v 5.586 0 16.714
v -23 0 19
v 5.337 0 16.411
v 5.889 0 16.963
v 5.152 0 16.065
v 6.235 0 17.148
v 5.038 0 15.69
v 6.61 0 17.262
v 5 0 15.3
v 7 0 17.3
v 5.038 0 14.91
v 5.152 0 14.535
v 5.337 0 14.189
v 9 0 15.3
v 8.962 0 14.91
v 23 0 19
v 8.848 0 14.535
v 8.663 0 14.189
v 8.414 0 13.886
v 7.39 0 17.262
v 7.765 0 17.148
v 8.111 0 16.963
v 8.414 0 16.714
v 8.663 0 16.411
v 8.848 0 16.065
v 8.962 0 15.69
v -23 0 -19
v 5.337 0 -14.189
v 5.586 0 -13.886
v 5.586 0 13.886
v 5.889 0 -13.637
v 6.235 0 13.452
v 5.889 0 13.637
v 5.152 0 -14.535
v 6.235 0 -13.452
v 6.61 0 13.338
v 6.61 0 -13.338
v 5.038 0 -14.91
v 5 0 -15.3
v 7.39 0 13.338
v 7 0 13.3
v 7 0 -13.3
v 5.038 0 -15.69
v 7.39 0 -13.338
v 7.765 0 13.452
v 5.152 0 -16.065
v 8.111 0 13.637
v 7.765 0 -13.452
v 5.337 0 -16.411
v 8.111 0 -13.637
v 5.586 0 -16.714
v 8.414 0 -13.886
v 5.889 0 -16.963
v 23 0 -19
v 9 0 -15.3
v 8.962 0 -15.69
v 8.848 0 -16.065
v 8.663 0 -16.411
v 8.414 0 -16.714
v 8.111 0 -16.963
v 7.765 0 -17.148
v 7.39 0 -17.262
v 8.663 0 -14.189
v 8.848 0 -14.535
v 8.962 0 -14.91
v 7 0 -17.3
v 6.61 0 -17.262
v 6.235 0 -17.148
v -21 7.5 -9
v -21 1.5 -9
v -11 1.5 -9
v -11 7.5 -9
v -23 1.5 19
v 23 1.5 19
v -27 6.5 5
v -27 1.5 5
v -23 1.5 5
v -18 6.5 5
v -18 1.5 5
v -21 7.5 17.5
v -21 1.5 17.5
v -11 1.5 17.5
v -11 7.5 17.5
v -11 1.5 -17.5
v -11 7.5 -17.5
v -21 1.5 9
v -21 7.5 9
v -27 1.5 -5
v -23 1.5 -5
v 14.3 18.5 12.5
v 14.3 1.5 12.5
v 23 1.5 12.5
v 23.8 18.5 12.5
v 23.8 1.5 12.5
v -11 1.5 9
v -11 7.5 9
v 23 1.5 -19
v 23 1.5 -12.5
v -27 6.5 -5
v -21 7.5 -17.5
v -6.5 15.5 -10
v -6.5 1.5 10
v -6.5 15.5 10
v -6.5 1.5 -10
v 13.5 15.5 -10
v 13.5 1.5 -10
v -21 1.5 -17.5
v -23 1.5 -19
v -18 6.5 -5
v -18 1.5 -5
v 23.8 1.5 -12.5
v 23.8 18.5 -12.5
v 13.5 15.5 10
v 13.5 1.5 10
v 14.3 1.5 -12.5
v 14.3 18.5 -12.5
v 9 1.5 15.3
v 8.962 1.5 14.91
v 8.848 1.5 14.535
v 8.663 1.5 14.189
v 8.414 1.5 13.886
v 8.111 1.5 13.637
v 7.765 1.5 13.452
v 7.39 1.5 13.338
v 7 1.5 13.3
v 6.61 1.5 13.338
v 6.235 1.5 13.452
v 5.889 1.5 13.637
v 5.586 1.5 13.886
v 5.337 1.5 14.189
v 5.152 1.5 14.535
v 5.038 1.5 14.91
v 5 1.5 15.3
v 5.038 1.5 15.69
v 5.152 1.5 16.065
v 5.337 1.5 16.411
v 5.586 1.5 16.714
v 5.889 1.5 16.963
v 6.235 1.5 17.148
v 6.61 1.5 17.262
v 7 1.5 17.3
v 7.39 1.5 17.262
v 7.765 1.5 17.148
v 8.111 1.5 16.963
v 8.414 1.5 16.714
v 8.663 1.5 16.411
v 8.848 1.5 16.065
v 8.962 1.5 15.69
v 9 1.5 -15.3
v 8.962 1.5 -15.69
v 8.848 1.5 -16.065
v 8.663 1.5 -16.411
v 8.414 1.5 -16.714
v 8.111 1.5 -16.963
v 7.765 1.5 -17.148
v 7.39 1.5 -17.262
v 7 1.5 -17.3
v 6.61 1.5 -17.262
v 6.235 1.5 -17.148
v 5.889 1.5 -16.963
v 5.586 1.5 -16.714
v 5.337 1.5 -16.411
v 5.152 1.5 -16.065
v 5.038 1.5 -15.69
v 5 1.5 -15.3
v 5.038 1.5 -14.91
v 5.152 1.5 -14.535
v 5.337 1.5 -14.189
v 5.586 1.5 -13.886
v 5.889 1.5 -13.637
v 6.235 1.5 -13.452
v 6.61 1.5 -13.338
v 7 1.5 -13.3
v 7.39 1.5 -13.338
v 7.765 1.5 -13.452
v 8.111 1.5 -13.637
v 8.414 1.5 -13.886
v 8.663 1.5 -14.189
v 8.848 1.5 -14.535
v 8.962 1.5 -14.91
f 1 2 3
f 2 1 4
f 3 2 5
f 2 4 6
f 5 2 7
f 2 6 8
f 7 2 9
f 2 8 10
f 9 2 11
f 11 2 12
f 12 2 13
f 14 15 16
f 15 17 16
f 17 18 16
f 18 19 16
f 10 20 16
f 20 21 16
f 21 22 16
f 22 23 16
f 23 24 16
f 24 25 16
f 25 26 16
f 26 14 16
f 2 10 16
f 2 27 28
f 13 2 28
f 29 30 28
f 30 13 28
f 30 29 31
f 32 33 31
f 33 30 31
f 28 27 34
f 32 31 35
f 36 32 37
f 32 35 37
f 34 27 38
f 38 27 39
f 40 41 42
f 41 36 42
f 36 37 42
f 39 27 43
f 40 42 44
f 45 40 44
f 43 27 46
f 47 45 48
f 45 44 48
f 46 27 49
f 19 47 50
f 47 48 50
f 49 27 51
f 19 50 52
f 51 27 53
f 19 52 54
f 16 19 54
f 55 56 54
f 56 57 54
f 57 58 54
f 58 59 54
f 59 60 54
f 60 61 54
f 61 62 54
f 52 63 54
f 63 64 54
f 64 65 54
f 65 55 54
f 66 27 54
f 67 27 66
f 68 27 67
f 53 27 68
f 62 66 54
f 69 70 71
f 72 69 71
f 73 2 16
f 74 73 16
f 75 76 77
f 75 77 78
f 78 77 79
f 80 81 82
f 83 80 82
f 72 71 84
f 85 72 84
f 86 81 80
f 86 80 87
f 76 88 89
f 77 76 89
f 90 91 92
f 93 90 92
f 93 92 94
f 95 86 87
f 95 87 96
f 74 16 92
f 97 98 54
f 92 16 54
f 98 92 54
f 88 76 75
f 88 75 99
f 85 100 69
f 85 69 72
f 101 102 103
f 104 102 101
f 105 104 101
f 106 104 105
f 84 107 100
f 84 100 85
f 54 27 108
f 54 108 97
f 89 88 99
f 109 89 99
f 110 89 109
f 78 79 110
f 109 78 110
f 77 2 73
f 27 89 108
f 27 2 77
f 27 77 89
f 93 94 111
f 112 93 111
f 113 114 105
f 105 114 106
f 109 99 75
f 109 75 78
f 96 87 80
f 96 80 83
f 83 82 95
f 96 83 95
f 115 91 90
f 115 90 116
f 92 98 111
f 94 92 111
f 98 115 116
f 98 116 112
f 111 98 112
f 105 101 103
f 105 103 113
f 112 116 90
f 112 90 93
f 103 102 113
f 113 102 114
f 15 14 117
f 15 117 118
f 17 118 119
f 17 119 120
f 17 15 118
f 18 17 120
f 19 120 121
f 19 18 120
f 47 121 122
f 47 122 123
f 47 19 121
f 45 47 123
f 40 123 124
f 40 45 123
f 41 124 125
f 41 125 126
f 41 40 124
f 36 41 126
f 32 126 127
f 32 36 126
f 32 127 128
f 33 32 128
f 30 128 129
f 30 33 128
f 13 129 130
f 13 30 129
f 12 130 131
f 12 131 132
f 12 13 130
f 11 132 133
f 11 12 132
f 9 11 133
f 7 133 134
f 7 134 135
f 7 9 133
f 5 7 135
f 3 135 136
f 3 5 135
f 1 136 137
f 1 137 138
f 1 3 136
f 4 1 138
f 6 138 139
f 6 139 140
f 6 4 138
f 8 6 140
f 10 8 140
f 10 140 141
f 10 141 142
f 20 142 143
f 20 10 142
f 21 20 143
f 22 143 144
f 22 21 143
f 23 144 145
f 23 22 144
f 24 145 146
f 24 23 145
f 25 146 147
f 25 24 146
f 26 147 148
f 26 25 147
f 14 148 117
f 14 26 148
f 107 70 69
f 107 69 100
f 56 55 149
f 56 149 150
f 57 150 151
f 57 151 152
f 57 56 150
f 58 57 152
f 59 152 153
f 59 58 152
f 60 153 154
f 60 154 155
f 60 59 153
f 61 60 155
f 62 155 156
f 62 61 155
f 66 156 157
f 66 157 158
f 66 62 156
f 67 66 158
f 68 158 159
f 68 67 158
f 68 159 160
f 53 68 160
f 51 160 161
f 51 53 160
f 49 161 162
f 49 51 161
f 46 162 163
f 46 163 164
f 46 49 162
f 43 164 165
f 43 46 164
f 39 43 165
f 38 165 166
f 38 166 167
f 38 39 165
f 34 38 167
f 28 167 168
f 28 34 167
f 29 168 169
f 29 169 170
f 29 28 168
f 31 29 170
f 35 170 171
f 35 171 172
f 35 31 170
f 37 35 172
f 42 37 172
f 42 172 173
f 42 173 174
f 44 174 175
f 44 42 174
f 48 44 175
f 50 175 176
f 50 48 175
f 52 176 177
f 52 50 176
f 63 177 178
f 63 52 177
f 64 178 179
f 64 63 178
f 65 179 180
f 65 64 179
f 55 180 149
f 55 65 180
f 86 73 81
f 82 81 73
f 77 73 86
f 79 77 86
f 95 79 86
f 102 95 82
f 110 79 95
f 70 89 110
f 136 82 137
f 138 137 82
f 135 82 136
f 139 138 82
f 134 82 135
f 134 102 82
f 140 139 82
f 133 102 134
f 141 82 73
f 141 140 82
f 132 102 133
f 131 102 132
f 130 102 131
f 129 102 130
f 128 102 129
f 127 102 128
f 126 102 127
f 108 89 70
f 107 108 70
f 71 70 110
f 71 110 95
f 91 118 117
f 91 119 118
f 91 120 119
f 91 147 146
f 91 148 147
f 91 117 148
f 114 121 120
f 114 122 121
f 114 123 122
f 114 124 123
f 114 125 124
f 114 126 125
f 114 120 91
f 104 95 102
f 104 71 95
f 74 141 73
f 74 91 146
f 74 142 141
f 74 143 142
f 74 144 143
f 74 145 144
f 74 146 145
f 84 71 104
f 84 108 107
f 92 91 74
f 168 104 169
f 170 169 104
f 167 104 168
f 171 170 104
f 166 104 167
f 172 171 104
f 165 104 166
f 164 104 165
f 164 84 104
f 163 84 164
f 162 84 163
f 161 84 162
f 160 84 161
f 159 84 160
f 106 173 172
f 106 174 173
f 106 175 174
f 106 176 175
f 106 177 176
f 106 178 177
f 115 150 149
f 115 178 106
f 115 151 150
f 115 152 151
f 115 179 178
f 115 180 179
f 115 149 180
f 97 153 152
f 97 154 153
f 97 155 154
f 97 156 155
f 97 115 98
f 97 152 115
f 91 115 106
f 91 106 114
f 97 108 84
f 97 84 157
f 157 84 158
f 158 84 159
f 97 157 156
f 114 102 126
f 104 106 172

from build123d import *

# Parameters (mm, degrees)
ESBO_O1_W                = 46
ESBO_O1_H                = 38
ESBO_O1_R                = 2
RESSALTO_EXTRUS_O1_DEPTH = 1.5
ESBO_O2_W                = 9
ESBO_O2_H                = 10
RESSALTO_EXTRUS_O2_DEPTH = 5
ESBO_O2_3_W              = 10
ESBO_O2_3_H              = 8.5
RESSALTO_EXTRUS_O3_DEPTH = 6
ESBO_O2_4_W              = 20
ESBO_O2_4_H              = 20
RESSALTO_EXTRUS_O4_DEPTH = 14
ESBO_O2_5_W              = 9.5
ESBO_O2_5_H              = 25
RESSALTO_EXTRUS_O5_DEPTH = 17


with BuildPart() as part:
    # Esboço1 → Ressalto-extrusão1 (new body)
    with BuildSketch(Plane(origin=(0, 0, 0), x_dir=(1, 0, 0), z_dir=(0, 1, 0))):
        Rectangle(ESBO_O1_W, ESBO_O1_H)
        with Locations((7, -15.3)):
            Circle(ESBO_O1_R, mode=Mode.SUBTRACT)
        with Locations((7, 15.3)):
            Circle(ESBO_O1_R, mode=Mode.SUBTRACT)
    extrude(amount=RESSALTO_EXTRUS_O1_DEPTH)

    # Esboço2 → Ressalto-extrusão2 (add)
    with BuildSketch(Plane(origin=(0, 1.5, 0), x_dir=(1, 0, 0), z_dir=(0, 1, 0))):
        with Locations((-22.5, 0)):
            Rectangle(ESBO_O2_W, ESBO_O2_H)
    extrude(amount=RESSALTO_EXTRUS_O2_DEPTH)

    # Esboço2<3> → Ressalto-extrusão3 (add)
    with BuildSketch(Plane(origin=(0, 1.5, 0), x_dir=(1, 0, 0), z_dir=(0, 1, 0))):
        with Locations((-16, -13.25)):
            Rectangle(ESBO_O2_3_W, ESBO_O2_3_H)
        with Locations((-16, 13.25)):
            Rectangle(ESBO_O2_3_W, ESBO_O2_3_H)
    extrude(amount=RESSALTO_EXTRUS_O3_DEPTH)

    # Esboço2<4> → Ressalto-extrusão4 (add)
    with BuildSketch(Plane(origin=(0, 1.5, 0), x_dir=(1, 0, 0), z_dir=(0, 1, 0))):
        with Locations((3.5, 0)):
            Rectangle(ESBO_O2_4_W, ESBO_O2_4_H)
    extrude(amount=RESSALTO_EXTRUS_O4_DEPTH)

    # Esboço2<5> → Ressalto-extrusão5 (add)
    with BuildSketch(Plane(origin=(0, 1.5, 0), x_dir=(1, 0, 0), z_dir=(0, 1, 0))):
        with Locations((19.05, 0)):
            Rectangle(ESBO_O2_5_W, ESBO_O2_5_H)
    extrude(amount=RESSALTO_EXTRUS_O5_DEPTH)


solid = part.part
